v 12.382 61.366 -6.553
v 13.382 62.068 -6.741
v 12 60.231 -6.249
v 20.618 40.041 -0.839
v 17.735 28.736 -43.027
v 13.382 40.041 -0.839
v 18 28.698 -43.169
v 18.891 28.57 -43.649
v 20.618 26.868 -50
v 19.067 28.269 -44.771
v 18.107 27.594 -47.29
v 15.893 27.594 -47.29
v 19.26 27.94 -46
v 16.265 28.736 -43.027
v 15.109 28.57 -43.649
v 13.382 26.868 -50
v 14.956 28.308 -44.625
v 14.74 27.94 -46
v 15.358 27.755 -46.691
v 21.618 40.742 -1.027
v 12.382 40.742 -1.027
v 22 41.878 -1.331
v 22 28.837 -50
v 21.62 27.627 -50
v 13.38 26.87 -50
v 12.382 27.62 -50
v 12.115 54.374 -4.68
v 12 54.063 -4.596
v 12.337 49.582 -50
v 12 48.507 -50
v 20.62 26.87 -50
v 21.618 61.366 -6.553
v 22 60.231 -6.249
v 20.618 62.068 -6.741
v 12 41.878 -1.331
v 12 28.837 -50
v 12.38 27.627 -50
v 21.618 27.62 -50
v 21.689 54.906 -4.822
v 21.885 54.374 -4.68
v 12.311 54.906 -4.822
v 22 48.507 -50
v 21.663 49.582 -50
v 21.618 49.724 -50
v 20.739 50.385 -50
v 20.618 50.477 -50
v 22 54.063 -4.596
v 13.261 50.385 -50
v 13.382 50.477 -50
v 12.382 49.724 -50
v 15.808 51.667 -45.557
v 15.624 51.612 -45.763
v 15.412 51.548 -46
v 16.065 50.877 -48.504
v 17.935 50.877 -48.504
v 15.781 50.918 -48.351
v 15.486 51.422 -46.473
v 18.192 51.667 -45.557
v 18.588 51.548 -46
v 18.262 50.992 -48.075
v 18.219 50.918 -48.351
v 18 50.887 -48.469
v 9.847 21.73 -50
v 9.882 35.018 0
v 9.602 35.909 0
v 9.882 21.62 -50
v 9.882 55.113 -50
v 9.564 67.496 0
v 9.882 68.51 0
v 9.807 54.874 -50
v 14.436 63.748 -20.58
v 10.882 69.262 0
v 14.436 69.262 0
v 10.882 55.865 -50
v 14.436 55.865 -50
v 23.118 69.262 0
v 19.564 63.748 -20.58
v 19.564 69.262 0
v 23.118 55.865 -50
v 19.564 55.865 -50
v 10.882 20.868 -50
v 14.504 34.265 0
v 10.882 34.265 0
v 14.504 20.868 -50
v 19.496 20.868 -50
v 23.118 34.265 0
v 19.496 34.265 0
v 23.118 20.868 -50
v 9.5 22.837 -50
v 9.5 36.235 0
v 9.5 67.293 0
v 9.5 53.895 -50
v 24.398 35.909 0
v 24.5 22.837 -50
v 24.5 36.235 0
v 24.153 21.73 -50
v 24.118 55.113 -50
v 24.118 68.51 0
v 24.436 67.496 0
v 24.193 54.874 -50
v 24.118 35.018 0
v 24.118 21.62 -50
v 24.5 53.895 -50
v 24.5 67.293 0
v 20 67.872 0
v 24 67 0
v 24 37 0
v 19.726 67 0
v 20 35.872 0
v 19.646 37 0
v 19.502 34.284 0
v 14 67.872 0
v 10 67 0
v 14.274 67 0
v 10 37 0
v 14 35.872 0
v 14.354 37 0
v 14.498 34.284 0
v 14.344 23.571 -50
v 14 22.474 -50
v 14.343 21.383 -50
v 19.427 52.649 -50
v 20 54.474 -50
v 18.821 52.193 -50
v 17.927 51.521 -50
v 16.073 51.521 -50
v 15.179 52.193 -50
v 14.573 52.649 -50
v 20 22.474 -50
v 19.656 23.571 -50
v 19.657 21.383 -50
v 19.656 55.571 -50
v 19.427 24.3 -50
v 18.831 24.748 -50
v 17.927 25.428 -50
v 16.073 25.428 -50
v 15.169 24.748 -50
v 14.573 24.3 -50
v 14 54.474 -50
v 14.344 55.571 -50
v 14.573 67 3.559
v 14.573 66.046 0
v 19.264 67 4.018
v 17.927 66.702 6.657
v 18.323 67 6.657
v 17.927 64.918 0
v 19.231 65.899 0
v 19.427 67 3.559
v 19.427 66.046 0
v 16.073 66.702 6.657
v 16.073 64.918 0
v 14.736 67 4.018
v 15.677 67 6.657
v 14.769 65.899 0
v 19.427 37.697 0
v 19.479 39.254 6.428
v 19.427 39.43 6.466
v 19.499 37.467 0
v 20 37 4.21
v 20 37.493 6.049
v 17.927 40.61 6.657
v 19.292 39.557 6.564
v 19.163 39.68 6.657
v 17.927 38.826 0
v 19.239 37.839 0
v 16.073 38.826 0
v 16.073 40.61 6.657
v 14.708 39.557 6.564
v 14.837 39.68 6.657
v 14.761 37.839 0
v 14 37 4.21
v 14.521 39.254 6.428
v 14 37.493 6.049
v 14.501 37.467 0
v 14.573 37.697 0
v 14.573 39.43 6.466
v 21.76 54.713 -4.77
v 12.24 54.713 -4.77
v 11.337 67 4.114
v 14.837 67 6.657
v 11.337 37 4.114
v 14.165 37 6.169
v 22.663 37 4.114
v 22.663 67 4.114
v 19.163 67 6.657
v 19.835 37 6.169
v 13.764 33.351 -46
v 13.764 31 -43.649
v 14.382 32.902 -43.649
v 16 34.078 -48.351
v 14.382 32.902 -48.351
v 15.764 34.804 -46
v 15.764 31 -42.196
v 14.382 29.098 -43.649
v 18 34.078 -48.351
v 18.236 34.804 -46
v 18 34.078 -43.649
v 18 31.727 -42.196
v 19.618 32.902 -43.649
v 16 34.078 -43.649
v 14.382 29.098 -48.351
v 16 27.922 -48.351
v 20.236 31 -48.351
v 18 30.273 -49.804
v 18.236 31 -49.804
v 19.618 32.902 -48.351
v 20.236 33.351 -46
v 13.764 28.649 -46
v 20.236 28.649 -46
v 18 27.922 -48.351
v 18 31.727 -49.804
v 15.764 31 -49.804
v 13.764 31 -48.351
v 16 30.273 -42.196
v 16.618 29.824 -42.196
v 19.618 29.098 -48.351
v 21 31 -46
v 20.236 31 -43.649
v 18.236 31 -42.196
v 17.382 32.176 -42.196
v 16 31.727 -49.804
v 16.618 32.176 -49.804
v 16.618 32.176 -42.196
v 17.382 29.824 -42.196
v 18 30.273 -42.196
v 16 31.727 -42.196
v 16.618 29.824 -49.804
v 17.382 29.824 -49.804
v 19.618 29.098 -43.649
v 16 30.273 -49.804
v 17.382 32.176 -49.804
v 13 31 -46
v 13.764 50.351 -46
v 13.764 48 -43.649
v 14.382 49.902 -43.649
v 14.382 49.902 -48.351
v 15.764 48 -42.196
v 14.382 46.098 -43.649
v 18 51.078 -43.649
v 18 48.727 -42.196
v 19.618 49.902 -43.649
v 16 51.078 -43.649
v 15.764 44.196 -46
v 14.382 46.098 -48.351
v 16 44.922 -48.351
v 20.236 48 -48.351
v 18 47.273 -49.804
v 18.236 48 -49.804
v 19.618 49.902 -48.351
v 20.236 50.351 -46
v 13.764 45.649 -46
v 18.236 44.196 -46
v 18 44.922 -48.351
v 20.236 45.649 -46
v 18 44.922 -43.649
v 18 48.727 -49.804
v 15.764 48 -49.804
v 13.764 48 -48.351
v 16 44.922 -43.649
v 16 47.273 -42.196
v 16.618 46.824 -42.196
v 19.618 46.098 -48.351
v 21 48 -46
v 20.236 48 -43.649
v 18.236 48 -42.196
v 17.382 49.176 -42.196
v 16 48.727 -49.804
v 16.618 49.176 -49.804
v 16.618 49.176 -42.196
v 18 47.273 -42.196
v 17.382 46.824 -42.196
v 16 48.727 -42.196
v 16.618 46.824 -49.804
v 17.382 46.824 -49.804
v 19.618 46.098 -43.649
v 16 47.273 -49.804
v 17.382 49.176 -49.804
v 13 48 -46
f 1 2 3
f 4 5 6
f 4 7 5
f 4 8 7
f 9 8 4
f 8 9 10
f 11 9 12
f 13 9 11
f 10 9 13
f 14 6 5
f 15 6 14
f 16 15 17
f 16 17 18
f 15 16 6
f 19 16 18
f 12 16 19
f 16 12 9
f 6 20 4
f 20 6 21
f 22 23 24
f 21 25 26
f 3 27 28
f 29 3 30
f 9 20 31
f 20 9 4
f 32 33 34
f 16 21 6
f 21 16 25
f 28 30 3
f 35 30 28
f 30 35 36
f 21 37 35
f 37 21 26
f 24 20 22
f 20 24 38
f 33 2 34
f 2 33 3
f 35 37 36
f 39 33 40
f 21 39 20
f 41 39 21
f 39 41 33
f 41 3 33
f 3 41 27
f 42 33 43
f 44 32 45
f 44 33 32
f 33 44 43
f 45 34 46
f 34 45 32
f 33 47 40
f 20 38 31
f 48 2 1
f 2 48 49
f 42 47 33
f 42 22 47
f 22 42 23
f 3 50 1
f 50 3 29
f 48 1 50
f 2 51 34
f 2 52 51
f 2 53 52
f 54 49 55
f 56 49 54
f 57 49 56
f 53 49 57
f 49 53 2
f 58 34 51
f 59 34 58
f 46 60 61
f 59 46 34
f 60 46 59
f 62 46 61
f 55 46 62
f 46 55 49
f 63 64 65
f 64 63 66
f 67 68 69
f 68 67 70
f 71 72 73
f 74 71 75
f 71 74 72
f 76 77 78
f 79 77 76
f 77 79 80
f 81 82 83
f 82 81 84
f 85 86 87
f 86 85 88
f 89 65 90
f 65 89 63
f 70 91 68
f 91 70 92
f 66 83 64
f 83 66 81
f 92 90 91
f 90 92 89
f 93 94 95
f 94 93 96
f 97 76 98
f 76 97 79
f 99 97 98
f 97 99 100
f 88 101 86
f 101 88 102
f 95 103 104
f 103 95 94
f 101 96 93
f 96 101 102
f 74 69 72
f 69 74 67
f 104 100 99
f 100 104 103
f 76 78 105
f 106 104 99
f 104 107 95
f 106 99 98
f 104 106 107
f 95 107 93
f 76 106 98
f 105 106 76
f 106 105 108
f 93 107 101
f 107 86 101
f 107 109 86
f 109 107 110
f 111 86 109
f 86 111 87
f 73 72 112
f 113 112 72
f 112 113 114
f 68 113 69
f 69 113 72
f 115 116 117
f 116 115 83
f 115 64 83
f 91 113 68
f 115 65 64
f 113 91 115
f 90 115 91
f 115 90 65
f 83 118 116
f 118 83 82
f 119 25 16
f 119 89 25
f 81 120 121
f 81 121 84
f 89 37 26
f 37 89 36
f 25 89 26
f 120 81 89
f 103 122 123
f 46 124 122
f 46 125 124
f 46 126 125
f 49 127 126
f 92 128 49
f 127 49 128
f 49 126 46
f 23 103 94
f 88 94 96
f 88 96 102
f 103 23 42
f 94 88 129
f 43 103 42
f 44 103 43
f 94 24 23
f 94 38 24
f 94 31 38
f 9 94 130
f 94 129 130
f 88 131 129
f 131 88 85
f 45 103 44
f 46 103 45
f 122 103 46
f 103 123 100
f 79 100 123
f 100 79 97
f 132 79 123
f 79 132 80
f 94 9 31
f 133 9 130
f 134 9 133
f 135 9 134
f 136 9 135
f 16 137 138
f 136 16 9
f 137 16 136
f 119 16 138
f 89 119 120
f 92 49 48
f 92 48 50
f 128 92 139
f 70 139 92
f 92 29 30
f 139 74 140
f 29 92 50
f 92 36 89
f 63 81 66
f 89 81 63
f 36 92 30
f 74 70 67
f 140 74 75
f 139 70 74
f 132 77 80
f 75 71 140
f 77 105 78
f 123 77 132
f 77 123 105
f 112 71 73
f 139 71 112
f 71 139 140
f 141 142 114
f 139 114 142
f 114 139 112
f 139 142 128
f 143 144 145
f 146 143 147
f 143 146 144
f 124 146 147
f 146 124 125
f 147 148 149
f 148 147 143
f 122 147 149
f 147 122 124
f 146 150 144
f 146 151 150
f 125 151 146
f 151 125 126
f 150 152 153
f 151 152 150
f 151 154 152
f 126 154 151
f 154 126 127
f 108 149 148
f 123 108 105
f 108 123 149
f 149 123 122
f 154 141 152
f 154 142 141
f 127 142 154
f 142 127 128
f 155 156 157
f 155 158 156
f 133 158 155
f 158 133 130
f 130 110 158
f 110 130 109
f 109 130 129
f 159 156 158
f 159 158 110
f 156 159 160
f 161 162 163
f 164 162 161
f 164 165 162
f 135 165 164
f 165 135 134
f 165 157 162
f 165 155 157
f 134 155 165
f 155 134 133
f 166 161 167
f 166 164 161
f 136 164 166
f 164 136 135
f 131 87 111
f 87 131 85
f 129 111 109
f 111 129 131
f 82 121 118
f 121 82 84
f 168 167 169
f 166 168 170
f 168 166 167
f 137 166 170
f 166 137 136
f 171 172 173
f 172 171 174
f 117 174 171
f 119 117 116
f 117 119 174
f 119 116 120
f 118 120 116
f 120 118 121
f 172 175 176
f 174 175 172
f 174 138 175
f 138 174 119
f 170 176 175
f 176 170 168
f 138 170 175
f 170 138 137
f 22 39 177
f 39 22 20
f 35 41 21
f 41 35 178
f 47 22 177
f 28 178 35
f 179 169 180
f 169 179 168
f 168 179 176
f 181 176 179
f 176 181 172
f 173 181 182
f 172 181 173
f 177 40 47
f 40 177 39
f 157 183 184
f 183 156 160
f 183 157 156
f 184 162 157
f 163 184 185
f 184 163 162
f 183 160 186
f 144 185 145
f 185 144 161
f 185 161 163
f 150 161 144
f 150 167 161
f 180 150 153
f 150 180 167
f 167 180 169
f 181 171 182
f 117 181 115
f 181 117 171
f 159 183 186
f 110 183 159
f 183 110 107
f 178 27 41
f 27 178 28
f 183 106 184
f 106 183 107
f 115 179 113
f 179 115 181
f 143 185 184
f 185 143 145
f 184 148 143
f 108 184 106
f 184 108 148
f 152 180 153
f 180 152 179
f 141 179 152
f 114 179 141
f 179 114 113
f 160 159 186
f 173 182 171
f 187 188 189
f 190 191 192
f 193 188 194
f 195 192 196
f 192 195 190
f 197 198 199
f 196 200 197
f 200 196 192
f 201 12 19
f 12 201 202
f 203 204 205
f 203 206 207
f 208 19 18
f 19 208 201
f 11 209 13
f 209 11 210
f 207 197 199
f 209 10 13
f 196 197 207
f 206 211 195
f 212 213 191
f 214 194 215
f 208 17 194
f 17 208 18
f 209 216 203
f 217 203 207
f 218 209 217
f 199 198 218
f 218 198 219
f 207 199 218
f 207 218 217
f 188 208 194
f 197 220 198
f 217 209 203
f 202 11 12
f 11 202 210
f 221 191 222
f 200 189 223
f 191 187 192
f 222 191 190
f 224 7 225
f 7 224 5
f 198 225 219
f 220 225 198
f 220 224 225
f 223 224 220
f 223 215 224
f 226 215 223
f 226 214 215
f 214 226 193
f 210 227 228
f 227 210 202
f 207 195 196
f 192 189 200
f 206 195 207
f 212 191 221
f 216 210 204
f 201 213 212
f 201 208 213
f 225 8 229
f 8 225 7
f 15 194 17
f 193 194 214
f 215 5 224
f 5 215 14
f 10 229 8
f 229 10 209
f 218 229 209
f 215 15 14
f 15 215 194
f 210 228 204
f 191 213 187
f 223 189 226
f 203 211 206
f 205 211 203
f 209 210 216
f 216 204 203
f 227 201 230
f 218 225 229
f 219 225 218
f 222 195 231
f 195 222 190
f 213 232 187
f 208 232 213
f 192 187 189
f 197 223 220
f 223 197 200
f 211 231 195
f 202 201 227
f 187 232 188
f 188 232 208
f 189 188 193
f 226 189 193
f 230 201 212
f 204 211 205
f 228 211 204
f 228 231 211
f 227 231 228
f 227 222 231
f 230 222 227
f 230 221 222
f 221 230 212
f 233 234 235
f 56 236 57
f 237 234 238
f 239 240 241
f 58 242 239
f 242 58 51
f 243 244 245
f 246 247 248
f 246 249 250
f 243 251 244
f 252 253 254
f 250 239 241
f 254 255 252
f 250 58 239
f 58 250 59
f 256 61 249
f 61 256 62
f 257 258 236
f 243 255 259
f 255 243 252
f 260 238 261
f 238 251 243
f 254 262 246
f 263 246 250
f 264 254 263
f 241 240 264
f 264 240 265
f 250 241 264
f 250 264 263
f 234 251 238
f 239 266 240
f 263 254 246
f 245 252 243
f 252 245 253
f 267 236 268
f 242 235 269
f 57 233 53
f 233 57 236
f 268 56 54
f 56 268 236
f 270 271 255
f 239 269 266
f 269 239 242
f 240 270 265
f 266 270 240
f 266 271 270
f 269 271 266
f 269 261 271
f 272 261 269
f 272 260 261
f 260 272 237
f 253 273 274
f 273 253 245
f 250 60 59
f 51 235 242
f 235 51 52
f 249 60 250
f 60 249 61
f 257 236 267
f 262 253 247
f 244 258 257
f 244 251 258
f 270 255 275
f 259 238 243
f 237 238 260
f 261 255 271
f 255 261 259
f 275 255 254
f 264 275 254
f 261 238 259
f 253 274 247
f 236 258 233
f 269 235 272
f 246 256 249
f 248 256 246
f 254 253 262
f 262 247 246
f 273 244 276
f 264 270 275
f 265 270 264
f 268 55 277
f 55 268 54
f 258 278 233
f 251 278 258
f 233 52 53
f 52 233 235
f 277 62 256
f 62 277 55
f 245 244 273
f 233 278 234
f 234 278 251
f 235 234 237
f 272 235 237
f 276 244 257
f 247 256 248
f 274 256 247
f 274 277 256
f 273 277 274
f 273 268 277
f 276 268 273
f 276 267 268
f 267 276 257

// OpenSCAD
$fn=10;   // For persion of polygons


union(){    // the brick.
difference(){    // setting up the top
rotate([-15,0,0]){  // clip base
translate([11.5,35,-50]){
minkowski(){
  cube([11,30,80]);
  cylinder(r=2,h=1);
}}}

translate([2.5,6,0]){
difference(){
rotate([-15,0,0]){  // clip hollow
translate([11.5,35,-43]){
minkowski(){
  cube([6,19,50]);
  cylinder(r=2,h=1);
}}}

translate([0,0,0]){ // cut the top off
    cube([100,100,50]);
}
}}

translate([0,0,0]){ // cut the top off
    cube([100,100,50]);
}
translate([0,0,-100]){ // cut the bottom off
    cube([100,100,50]);
}
translate([17,25,-160]){
rotate([-15,0,0]){  // rubberband track1
  cylinder(r=3,h=190);
}}
translate([17,-7,-160]){
rotate([-15,0,0]){  // rubberband track2
  cylinder(r=3,h=190);
}}}

difference(){
translate([17,37,0]){  // cork
rotate([-90,0,0]){
  cylinder(r=7,h=30);
}}

translate([2.5,6,0]){
difference(){
rotate([-15,0,0]){  // clip hollow
translate([11.5,35,-43]){
minkowski(){
  cube([6,20,50]);
  cylinder(r=2,h=1);
}}}

translate([0,0,0]){ // cut the top off
    cube([100,100,50]);
}
}}
translate([17,25,-160]){
rotate([-15,0,0]){  // rubberband track1
  cylinder(r=3,h=190);
}}
translate([17,-7,-160]){
rotate([-15,0,0]){  // rubberband track2
  cylinder(r=3,h=190);
}}}

translate([17,31,-46]){ //rubberband handle 1
    sphere(4);
}
translate([17,48,-46]){ //rubberband handle 2
    sphere(4);
}
}// the end of the union... so sad.
